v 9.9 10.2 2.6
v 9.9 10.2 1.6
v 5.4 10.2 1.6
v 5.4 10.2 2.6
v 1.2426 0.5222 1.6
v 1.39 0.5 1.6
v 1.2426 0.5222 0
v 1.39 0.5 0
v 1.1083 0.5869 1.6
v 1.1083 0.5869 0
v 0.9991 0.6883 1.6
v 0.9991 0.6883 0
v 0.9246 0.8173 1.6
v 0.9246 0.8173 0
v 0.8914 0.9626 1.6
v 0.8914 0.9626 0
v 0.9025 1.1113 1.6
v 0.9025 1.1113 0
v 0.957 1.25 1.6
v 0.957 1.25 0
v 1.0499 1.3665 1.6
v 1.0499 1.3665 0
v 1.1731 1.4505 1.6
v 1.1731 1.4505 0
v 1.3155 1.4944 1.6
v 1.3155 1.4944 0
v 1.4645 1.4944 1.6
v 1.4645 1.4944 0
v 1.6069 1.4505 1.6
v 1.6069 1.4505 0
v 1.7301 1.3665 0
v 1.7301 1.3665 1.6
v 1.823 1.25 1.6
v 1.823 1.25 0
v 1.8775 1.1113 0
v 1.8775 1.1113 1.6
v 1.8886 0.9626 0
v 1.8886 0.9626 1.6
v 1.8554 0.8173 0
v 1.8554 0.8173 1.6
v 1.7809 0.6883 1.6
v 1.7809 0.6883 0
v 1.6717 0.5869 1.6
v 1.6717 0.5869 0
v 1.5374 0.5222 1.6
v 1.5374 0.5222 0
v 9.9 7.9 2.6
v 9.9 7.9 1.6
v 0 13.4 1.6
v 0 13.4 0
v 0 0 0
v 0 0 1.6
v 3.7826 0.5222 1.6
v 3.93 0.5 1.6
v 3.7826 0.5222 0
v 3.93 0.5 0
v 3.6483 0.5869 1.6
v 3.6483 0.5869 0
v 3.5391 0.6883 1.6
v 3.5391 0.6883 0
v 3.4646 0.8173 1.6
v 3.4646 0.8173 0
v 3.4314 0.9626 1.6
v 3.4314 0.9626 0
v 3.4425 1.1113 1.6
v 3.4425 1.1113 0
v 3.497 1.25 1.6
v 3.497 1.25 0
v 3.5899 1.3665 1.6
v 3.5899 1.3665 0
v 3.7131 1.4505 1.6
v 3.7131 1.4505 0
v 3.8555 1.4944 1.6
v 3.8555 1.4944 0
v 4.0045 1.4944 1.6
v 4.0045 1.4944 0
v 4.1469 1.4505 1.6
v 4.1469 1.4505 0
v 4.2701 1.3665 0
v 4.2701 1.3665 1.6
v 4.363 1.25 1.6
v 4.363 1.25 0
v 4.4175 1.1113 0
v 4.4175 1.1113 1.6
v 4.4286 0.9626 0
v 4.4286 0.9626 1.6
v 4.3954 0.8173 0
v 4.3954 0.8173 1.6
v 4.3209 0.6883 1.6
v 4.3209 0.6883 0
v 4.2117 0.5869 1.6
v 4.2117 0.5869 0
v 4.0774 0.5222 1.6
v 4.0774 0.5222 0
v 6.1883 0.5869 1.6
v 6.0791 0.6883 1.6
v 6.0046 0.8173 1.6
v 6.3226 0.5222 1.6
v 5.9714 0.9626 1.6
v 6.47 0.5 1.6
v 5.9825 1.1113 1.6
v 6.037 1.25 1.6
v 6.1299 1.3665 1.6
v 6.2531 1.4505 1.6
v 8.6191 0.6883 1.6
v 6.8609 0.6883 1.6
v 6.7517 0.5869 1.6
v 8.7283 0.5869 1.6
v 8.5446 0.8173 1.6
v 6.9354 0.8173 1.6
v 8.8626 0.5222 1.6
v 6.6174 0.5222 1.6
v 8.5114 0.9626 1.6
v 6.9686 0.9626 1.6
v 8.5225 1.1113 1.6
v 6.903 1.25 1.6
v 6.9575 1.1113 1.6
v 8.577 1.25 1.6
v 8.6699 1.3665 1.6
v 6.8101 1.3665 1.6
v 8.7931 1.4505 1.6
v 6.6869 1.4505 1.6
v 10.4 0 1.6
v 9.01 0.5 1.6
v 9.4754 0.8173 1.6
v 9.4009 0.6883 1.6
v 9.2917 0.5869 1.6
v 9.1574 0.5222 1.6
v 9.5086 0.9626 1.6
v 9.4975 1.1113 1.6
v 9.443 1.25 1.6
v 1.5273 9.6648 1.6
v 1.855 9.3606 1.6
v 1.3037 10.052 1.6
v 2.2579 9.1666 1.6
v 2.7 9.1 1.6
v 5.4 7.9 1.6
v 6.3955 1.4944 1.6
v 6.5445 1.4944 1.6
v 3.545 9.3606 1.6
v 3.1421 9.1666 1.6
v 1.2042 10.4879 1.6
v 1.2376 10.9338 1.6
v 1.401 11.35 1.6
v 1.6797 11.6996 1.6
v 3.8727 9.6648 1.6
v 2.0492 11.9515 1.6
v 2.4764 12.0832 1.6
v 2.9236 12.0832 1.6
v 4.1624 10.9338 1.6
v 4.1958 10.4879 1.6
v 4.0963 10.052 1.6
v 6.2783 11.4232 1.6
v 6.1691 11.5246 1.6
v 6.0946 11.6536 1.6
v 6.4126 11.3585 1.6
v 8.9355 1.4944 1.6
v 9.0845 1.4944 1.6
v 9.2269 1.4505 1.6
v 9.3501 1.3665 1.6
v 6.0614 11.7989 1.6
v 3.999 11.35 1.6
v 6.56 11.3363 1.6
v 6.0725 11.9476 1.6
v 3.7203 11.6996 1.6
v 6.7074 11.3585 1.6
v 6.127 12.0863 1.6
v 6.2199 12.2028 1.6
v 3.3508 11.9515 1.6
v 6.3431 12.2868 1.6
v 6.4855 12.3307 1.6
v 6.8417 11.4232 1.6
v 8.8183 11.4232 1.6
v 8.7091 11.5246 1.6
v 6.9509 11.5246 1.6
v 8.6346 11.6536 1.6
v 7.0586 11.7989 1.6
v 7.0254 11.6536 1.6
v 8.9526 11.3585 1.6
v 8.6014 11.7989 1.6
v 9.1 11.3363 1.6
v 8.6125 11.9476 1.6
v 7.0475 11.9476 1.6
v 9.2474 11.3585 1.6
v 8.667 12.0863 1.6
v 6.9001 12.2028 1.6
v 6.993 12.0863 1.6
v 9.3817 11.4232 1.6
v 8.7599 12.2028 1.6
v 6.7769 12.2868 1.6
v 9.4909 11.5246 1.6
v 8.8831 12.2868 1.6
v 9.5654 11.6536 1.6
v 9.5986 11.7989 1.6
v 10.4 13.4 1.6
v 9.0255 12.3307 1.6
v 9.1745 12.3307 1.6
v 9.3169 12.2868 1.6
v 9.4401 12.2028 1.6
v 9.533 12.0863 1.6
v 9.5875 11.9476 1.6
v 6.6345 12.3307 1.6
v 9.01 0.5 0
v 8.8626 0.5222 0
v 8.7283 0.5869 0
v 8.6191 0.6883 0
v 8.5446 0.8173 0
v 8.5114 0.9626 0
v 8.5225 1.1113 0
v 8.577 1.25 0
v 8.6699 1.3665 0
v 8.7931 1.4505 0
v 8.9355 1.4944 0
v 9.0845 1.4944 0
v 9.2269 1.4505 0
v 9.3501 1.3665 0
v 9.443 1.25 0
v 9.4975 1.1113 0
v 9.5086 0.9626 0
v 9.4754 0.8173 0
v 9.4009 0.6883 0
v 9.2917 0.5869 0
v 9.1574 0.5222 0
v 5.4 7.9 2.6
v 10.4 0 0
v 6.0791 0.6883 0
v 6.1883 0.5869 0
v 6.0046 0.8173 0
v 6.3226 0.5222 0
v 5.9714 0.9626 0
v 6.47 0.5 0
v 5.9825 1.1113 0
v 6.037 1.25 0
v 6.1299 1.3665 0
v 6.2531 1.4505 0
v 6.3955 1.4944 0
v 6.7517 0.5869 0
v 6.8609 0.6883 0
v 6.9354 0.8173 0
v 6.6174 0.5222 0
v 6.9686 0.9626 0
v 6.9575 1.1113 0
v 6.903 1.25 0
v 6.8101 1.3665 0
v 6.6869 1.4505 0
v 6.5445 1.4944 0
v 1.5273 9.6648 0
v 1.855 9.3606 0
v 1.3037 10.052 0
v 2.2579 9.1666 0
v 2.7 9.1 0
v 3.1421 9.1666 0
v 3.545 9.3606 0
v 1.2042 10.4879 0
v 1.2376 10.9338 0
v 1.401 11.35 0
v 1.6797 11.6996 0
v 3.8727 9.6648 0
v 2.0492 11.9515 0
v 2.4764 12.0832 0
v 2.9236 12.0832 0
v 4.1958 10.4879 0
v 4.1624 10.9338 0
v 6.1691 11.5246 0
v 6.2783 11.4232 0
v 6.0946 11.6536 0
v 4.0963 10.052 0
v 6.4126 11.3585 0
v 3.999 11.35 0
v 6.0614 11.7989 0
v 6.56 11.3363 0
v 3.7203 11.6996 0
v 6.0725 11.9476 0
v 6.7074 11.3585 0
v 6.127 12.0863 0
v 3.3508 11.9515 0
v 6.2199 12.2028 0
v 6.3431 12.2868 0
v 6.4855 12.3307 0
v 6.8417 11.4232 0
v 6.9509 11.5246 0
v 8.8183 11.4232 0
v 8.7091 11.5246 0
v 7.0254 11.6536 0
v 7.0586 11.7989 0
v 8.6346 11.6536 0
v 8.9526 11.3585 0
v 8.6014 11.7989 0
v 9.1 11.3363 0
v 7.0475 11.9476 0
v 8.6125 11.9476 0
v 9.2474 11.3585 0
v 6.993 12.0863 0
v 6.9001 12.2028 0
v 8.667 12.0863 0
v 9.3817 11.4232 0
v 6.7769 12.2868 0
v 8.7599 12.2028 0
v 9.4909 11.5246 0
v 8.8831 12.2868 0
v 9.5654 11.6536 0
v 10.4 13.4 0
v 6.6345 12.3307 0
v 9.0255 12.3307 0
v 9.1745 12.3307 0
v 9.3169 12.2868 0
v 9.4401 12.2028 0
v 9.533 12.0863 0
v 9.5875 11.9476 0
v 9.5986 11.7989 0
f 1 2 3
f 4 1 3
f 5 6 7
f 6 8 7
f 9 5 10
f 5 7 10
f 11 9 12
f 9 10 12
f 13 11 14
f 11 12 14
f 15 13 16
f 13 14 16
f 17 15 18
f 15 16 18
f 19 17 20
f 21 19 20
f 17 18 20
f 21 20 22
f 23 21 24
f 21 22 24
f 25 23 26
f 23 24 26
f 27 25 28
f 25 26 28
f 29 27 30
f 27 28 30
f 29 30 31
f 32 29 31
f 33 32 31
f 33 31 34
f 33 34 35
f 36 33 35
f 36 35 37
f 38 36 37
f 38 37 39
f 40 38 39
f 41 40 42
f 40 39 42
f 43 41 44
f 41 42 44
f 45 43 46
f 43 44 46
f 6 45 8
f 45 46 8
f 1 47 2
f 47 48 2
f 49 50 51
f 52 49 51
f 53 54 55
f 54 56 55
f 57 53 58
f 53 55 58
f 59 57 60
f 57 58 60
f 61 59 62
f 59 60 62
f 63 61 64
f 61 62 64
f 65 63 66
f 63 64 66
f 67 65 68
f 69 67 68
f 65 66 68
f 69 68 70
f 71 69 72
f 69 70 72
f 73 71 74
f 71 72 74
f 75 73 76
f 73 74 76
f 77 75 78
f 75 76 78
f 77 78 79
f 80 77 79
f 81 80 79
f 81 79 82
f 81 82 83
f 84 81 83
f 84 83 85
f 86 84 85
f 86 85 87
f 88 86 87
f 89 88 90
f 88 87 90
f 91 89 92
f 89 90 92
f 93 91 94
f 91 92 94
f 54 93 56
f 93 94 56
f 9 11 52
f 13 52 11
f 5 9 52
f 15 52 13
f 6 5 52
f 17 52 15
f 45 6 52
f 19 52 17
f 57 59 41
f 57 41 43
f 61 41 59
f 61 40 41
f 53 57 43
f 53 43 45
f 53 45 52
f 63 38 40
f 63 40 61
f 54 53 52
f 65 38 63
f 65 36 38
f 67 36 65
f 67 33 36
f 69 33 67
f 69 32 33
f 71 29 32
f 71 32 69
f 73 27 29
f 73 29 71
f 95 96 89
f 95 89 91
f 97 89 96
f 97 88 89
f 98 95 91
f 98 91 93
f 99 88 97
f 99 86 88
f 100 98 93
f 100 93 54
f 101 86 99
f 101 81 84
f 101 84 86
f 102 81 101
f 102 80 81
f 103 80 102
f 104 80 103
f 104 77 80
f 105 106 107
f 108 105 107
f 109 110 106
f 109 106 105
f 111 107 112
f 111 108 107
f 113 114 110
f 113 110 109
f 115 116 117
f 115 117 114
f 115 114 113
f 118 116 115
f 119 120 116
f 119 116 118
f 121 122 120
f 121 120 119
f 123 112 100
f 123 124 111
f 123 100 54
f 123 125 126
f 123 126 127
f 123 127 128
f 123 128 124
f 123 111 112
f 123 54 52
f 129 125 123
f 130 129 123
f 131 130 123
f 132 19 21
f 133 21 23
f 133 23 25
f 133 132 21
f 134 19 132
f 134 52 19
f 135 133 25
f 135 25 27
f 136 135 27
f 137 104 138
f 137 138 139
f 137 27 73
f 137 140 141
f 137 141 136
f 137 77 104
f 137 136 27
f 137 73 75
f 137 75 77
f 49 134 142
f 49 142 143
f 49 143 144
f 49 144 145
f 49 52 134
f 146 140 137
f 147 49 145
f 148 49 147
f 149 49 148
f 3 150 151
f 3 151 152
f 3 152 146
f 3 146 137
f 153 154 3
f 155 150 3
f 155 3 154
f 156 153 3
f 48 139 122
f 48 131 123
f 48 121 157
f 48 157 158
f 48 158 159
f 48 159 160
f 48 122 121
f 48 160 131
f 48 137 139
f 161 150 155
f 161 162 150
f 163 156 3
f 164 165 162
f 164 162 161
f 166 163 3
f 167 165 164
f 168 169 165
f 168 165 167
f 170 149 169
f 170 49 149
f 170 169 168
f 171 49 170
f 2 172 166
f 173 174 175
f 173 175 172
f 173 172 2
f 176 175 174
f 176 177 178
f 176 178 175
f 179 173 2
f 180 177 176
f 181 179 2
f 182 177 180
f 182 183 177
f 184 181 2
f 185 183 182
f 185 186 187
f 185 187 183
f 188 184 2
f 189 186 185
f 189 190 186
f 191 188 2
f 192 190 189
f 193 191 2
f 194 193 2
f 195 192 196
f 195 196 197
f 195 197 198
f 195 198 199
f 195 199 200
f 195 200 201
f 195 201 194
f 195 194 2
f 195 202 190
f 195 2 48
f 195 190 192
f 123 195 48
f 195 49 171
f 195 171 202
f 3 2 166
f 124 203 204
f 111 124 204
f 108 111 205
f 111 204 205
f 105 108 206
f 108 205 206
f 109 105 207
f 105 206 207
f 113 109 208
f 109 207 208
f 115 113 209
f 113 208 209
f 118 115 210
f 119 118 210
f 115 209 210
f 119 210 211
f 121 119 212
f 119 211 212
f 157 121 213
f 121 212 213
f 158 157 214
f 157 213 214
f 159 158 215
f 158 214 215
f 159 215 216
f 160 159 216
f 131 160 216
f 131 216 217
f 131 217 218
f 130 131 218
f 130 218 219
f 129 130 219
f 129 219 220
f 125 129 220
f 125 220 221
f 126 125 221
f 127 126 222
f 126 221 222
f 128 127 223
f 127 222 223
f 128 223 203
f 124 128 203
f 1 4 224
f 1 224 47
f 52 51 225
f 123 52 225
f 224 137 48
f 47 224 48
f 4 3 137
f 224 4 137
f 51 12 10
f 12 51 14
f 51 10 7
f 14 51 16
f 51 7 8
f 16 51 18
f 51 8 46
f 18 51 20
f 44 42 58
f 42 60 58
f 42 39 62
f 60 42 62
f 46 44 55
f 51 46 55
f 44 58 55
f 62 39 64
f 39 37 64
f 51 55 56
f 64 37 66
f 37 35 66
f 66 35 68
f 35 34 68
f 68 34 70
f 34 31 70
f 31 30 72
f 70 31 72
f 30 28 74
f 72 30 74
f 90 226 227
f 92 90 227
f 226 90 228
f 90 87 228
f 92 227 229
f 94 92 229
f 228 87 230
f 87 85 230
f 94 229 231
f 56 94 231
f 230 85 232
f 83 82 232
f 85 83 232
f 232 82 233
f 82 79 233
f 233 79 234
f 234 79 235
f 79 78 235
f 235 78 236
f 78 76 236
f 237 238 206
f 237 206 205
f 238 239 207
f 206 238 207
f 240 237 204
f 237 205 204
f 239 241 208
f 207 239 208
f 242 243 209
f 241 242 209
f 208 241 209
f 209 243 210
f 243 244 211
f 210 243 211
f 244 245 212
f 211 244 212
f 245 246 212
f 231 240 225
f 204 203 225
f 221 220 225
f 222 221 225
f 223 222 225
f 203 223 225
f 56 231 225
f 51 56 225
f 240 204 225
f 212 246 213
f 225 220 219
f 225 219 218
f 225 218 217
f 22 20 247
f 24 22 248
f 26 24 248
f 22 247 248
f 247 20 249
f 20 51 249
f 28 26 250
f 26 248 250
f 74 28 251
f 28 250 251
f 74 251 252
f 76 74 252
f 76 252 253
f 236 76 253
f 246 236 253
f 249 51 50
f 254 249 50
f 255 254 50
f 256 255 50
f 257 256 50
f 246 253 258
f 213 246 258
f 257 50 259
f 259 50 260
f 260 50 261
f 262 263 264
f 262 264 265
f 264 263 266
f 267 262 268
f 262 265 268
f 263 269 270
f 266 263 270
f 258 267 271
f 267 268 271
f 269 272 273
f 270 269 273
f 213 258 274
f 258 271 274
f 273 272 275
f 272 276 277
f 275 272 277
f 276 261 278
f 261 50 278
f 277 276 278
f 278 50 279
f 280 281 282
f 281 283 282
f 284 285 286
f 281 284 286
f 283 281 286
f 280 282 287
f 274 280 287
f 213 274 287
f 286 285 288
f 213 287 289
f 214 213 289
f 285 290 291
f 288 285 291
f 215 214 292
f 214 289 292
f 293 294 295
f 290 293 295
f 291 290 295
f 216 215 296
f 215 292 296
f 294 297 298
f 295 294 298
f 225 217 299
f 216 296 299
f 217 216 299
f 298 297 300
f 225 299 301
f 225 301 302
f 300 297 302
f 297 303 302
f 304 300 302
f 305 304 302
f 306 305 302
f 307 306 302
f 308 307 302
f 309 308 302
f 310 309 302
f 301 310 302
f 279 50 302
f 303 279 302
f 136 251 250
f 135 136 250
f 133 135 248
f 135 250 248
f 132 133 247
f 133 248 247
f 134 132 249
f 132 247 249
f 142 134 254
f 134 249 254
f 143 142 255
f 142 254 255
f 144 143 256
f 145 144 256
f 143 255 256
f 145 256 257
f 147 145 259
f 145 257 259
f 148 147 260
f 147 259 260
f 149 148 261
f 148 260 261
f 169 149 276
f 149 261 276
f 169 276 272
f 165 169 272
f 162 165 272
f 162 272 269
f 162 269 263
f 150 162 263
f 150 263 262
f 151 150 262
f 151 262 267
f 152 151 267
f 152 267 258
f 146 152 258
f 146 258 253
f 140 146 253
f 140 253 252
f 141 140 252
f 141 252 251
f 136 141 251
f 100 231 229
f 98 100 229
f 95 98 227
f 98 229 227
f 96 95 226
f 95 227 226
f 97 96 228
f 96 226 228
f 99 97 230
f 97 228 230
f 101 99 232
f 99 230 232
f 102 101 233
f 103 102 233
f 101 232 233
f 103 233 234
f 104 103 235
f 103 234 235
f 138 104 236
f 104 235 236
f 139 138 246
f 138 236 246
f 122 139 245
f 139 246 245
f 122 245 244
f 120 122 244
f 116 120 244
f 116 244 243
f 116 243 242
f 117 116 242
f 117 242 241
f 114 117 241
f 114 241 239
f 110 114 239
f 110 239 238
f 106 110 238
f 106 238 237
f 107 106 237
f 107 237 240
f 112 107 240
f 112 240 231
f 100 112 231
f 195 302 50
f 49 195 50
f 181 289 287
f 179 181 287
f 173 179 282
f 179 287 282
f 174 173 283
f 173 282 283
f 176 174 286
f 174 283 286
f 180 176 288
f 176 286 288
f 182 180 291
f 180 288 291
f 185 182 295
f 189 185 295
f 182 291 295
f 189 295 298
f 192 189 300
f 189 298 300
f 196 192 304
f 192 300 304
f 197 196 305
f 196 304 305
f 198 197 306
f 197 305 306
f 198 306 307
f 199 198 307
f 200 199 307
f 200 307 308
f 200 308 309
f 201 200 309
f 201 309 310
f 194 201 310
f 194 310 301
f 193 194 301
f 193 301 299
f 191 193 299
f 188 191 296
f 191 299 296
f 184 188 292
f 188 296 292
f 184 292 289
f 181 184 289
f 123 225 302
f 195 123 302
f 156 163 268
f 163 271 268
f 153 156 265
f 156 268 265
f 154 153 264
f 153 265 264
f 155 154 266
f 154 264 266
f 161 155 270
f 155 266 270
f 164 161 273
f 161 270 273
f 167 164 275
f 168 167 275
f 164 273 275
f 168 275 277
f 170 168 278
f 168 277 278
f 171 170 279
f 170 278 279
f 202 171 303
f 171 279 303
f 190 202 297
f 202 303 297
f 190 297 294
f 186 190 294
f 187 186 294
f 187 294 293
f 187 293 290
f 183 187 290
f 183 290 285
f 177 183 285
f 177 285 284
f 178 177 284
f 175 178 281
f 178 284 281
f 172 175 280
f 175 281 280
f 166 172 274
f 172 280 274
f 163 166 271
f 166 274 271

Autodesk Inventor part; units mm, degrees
ref_plane "YZ Plane" through (0, 0, 0) normal (1, 0, 0) x (0, 1, 0)
ref_plane "XZ Plane" through (0, 0, 0) normal (0, 1, 0) x (-1, 0, 0)
ref_plane "XY Plane" through (0, 0, 0) normal (0, 0, 1) x (1, 0, 0)
sketch "Sketch1" plane through (0, 0, 0) normal (0, 0, 1) x (1, 0, 0)
  line L0 (0, 0) -> (10.4, 0)
  line L1 (10.4, 0) -> (10.4, 13.4)
  line L2 (10.4, 13.4) -> (0, 13.4)
  line L3 (0, 13.4) -> (0, 0)
  dimension "d0" = 10.4
  dimension "d1" = 13.4
extrude "Extrusion1" add sketch "Sketch1" along normal blind 1.6
sketch "Sketch2" plane through (0, 0, 1.6) normal (0, 0, 1) x (1, 0, 0)
  line L0 (10.4, 13.4) -> (0, 13.4) projected
  line L1 (0, 13.4) -> (0, 0) projected
  point P0 (2.7, 10.6)
  dimension "d4" = 2.8
  dimension "d5" = 2.7
hole "Hole1" at (2.7, 10.6, 1.6) direction (0, 0, -1) diameter 3 depth 1.6
sketch "Sketch3" plane through (0, 0, 1.6) normal (0, 0, 1) x (1, 0, 0)
  line L0 (0, 13.4) -> (0, 0) projected
  line L1 (10.4, 0) -> (10.4, 13.4) projected
  line L2 (0, 0) -> (10.4, 0) projected
  point P0 (1.39, 1)
  point P1 (3.93, 1)
  point P2 (6.47, 1)
  point P3 (9.01, 1)
  point P4 (6.56, 11.8363)
  point P5 (9.1, 11.8363)
  dimension "d13" = 2.54
  dimension "d14" = 2.54
  dimension "d15" = 2.54
  dimension "d16" = 1.39
  dimension "d17" = 2.54
  dimension "d18" = 1.3
  dimension "d19" = 1
hole "Hole2" at (1.39, 1, 1.6) at (3.93, 1, 1.6) at (6.47, 1, 1.6) at (9.01, 1, 1.6) at (6.56, 11.8363, 1.6) at (9.1, 11.8363, 1.6) direction (0, 0, -1) diameter 1 end through all
sketch "Sketch4" plane through (0, 0, 1.6) normal (0, 0, 1) x (1, 0, 0)
  line L0 (5.4, 7.9) -> (9.9, 7.9)
  line L1 (9.9, 7.9) -> (9.9, 10.2)
  line L2 (9.9, 10.2) -> (5.4, 10.2)
  line L3 (5.4, 10.2) -> (5.4, 7.9)
  line L4 (10.4, 0) -> (10.4, 13.4) projected
  line L5 (10.4, 13.4) -> (0, 13.4) projected
  point P0 (0, 0)
  dimension "d27" = 4.5
  dimension "d28" = 2.3
  dimension "d29" = 0.5
  dimension "d30" = 3.2
extrude "Extrusion2" add sketch "Sketch4" along normal blind 1
properties part number "vl53l0x"
